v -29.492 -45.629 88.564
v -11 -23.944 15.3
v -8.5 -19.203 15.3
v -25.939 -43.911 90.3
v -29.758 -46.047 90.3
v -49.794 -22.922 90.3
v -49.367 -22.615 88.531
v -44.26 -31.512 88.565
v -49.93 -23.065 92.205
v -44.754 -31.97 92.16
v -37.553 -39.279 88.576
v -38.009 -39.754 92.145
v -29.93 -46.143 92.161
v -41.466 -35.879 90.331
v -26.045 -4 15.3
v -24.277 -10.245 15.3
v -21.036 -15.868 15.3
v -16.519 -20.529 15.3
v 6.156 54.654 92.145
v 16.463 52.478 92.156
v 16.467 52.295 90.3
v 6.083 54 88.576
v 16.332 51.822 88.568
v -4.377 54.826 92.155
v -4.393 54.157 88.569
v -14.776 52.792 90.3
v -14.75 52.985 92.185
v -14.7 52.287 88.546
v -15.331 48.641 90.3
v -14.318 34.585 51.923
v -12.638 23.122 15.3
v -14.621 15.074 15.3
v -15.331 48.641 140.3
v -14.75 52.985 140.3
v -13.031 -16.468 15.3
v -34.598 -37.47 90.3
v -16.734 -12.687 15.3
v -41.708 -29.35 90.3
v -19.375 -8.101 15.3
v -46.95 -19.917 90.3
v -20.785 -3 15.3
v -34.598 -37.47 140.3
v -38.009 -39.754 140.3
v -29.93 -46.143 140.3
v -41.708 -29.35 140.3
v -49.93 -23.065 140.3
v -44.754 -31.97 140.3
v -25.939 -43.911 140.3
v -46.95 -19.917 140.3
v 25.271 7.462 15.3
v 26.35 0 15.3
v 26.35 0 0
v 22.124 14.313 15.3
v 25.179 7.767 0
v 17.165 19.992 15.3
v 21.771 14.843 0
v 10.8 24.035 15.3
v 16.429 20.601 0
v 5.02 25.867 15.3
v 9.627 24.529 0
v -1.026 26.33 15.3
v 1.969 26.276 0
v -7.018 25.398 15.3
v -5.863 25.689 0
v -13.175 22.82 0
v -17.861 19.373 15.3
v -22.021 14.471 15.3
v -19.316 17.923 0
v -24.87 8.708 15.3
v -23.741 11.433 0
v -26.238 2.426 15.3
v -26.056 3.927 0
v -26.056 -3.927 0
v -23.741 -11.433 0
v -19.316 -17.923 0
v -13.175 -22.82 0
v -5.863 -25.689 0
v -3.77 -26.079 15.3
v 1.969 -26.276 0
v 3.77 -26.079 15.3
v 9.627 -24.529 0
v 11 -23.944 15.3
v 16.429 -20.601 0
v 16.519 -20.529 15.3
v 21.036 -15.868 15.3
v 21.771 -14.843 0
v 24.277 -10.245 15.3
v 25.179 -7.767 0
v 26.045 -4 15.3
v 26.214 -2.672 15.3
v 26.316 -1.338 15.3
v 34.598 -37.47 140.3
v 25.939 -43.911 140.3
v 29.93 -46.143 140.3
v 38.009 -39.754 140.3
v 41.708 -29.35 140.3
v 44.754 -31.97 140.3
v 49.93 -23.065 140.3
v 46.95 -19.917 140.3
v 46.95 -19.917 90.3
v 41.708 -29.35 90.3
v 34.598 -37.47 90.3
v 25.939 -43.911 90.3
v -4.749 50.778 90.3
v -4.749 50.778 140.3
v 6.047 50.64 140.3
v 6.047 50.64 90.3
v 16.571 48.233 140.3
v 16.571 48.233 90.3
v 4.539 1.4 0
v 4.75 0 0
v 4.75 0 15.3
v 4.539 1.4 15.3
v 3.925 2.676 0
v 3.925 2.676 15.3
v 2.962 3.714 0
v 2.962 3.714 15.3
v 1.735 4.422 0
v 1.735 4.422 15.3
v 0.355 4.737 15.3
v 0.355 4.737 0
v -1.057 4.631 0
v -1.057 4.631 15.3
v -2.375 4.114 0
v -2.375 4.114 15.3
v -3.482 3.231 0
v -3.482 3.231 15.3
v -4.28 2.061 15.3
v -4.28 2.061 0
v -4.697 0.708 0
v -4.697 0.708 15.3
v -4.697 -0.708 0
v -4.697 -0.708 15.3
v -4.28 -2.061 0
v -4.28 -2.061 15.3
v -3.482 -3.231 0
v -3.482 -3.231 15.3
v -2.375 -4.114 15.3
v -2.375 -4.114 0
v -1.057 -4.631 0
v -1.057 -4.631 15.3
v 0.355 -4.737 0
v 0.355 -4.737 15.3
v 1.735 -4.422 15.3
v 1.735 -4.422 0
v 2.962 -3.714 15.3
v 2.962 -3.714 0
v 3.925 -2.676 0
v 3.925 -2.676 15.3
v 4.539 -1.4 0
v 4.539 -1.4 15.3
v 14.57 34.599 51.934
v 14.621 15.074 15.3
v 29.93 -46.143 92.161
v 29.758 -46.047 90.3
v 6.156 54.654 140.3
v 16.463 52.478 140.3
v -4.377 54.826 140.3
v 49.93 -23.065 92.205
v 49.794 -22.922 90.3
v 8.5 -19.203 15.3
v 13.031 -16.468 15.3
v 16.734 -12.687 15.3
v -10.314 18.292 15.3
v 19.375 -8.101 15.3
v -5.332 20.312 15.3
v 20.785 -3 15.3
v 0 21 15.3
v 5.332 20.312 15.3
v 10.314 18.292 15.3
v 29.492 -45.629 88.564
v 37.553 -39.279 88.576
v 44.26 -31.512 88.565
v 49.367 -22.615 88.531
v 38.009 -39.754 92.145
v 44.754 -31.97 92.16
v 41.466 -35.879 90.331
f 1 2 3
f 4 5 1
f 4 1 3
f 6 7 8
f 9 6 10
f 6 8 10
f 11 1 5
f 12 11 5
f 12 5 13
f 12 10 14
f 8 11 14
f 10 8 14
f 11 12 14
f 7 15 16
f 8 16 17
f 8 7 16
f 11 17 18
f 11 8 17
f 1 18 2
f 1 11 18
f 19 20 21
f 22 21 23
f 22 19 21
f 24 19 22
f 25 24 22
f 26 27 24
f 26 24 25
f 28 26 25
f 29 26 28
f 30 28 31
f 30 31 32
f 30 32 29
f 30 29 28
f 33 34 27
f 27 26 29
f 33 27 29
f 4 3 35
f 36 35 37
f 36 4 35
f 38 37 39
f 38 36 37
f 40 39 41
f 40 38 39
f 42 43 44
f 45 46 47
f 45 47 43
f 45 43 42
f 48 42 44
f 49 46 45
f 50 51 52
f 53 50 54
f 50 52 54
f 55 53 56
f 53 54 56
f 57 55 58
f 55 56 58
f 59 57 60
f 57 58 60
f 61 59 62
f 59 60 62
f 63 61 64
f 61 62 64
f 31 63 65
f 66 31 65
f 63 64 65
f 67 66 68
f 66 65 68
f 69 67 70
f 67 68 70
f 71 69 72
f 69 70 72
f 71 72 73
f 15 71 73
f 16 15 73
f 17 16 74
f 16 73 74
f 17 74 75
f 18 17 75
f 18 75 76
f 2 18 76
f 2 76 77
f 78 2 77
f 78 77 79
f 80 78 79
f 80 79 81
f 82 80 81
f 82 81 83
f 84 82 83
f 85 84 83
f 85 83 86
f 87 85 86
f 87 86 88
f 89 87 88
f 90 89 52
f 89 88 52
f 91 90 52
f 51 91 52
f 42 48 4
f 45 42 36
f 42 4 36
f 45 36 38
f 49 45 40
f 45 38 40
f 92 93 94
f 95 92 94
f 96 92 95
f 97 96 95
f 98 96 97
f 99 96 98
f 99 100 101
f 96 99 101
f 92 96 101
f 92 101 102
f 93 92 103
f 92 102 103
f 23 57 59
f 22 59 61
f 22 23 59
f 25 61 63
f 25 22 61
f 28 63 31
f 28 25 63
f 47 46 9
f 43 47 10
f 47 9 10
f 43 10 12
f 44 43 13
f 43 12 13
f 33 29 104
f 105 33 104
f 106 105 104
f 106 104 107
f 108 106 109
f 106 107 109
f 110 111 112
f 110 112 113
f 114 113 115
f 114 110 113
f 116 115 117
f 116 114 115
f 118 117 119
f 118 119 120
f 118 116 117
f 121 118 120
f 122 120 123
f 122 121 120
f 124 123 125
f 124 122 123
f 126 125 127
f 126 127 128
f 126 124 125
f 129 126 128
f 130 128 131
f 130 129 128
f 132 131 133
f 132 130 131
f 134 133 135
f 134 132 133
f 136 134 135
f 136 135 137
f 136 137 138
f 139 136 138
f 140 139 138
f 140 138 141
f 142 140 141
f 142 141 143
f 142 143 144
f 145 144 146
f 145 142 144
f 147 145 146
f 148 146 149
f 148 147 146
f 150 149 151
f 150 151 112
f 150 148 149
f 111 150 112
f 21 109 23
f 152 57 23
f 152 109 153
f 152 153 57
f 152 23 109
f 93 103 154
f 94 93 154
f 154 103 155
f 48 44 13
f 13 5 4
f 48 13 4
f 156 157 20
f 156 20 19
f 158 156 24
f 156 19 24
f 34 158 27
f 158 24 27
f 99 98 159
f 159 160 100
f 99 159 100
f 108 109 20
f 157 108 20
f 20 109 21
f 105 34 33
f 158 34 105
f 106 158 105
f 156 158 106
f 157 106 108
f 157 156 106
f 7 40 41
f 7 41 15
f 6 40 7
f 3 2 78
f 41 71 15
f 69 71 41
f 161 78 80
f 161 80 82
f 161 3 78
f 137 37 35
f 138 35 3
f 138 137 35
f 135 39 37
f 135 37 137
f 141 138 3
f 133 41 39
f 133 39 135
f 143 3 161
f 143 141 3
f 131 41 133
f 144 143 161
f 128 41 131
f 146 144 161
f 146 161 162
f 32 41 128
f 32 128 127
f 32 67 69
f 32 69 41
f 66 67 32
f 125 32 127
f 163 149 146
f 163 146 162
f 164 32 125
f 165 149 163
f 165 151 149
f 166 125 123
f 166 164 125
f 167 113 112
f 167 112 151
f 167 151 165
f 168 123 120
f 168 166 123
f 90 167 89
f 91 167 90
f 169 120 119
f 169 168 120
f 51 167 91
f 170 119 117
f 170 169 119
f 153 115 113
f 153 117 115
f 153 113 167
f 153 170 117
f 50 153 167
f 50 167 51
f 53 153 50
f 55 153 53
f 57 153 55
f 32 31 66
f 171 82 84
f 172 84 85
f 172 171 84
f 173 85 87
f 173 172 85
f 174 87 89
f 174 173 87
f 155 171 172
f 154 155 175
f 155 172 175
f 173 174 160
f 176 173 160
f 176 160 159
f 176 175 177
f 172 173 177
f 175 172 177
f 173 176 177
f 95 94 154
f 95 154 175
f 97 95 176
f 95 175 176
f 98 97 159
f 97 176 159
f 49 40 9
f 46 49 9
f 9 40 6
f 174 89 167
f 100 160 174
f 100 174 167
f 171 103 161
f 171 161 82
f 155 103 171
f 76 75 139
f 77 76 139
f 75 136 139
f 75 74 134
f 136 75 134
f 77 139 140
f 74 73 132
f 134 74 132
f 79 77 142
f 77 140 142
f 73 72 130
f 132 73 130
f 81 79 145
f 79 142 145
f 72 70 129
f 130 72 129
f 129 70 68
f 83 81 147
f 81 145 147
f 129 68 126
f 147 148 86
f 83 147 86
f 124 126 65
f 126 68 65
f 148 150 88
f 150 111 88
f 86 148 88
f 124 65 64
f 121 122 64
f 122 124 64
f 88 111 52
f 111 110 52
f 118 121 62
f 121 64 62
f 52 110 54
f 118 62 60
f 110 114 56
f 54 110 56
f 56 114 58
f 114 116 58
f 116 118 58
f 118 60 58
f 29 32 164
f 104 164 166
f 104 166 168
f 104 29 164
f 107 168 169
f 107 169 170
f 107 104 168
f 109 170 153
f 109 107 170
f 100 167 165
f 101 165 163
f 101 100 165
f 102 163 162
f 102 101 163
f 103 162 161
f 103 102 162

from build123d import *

# Parameters (mm, degrees)
F0_R      = 26.35
F0_R_2    = 4.75
F1_DEPTH  = 15.3
F10_DEPTH = 50
F11_R     = 10


with BuildPart() as f1:
    # F0 (on Top) → F1 (new body)
    with BuildSketch(Plane.XY):
        Circle(F0_R)
        Circle(F0_R_2, mode=Mode.SUBTRACT)
    extrude(amount=F1_DEPTH)

    # F3 (on offset) → F6 section 0
    with BuildSketch(Plane.XY.offset(15.3)):
        with BuildLine():
            Line((-20.7846096908, -3), (-26.0446251653, -4))
            ThreePointArc((-26.0446251653, -4), (-21.0361208605, -15.8683369999), (-11, -23.944153775))
            Line((-11, -23.944153775), (-8.5, -19.2028643697))
            ThreePointArc((-8.5, -19.2028643697), (-16.7341057315, -12.6873837086), (-20.7846096908, -3))
        make_face()
    # F5 (on offset) → F6 section 1
    with BuildSketch(Plane.XY.offset(90.3)):
        with BuildLine():
            Line((-46.9500885253, -19.917057701), (-49.9299671879, -23.0650899979))
            ThreePointArc((-49.9299671879, -23.0650899979), (-41.5639565173, -36.0199600032), (-29.9302797625, -46.1430206352))
            Line((-29.9302797625, -46.1430206352), (-25.939226182, -43.9107793723))
            ThreePointArc((-25.939226182, -43.9107793723), (-38.3684469263, -33.5985458088), (-46.9500885253, -19.917057701))
        make_face()
    loft()

    # F3 (on offset) → F7 section 0
    with BuildSketch(Plane.XY.offset(15.3)):
        with BuildLine():
            ThreePointArc((11, -23.944153775), (21.0361208605, -15.8683369999), (26.0446251653, -4))
            Line((26.0446251653, -4), (20.7846096908, -3))
            ThreePointArc((20.7846096908, -3), (16.7341057315, -12.6873837086), (8.5, -19.2028643697))
            Line((8.5, -19.2028643697), (11, -23.944153775))
        make_face()
    # F5 (on offset) → F7 section 1
    with BuildSketch(Plane.XY.offset(90.3)):
        with BuildLine():
            ThreePointArc((29.9302797625, -46.1430206352), (41.5639565173, -36.0199600032), (49.9299671879, -23.0650899979))
            Line((49.9299671879, -23.0650899979), (46.9500885253, -19.917057701))
            ThreePointArc((46.9500885253, -19.917057701), (38.3684469263, -33.5985458088), (25.939226182, -43.9107793723))
            Line((25.939226182, -43.9107793723), (29.9302797625, -46.1430206352))
        make_face()
    loft()

    # F3 (on offset) → F8 section 0
    with BuildSketch(Plane.XY.offset(15.3)):
        with BuildLine():
            Line((14.6209088882, 15.0741176618), (10.8002551784, 24.0349118592))
            ThreePointArc((10.8002551784, 24.0349118592), (-1.0259388653, 26.3300199287), (-12.6376925006, 23.1216614511))
            Line((-12.6376925006, 23.1216614511), (-14.6209088882, 15.0741176618))
            ThreePointArc((-14.6209088882, 15.0741176618), (0, 21), (14.6209088882, 15.0741176618))
        make_face()
    # F5 (on offset) → F8 section 1
    with BuildSketch(Plane.XY.offset(90.3)):
        with BuildLine():
            Line((16.5707036778, 48.232891056), (16.4626845195, 52.4783766747))
            ThreePointArc((16.4626845195, 52.4783766747), (0.8932369884, 54.9927461369), (-14.7496566957, 52.9853529512))
            Line((-14.7496566957, 52.9853529512), (-15.3308061409, 48.641200469))
            ThreePointArc((-15.3308061409, 48.641200469), (0.6526987204, 50.9958232052), (16.5707036778, 48.232891056))
        make_face()
    loft()

    # F9 (on offset) → F10 (join)
    with BuildSketch(Plane.XY.offset(90.3)):
        with BuildLine():
            Line((16.5707036778, 48.232891056), (16.4626845195, 52.4783766747))
            ThreePointArc((16.4626845195, 52.4783766747), (0.8932369884, 54.9927461369), (-14.7496566957, 52.9853529512))
            Line((-14.7496566957, 52.9853529512), (-15.3308061409, 48.641200469))
            ThreePointArc((-15.3308061409, 48.641200469), (0.6526987204, 50.9958232052), (16.5707036778, 48.232891056))
        make_face()
        with BuildLine():
            ThreePointArc((-25.939226182, -43.9107793723), (-38.3684469263, -33.5985458088), (-46.9500885253, -19.917057701))
            Line((-46.9500885253, -19.917057701), (-49.9299671879, -23.0650899979))
            ThreePointArc((-49.9299671879, -23.0650899979), (-41.5639565173, -36.0199600032), (-29.9302797625, -46.1430206352))
            Line((-29.9302797625, -46.1430206352), (-25.939226182, -43.9107793723))
        make_face()
        with BuildLine():
            ThreePointArc((46.9500885253, -19.917057701), (38.3684469263, -33.5985458088), (25.939226182, -43.9107793723))
            Line((25.939226182, -43.9107793723), (29.9302797625, -46.1430206352))
            ThreePointArc((29.9302797625, -46.1430206352), (41.5639565173, -36.0199600032), (49.9299671879, -23.0650899979))
            Line((49.9299671879, -23.0650899979), (46.9500885253, -19.917057701))
        make_face()
    extrude(amount=F10_DEPTH)

    # F11
    f11_edges = [f1.edges().sort_by_distance(p)[0] for p in [
        (-41.563957, -36.01996, 90.3),
        (41.563957, -36.01996, 90.3),
        (0.893237, 54.992746, 90.3),
    ]]
    fillet(f11_edges, radius=F11_R)


solid = f1.part
